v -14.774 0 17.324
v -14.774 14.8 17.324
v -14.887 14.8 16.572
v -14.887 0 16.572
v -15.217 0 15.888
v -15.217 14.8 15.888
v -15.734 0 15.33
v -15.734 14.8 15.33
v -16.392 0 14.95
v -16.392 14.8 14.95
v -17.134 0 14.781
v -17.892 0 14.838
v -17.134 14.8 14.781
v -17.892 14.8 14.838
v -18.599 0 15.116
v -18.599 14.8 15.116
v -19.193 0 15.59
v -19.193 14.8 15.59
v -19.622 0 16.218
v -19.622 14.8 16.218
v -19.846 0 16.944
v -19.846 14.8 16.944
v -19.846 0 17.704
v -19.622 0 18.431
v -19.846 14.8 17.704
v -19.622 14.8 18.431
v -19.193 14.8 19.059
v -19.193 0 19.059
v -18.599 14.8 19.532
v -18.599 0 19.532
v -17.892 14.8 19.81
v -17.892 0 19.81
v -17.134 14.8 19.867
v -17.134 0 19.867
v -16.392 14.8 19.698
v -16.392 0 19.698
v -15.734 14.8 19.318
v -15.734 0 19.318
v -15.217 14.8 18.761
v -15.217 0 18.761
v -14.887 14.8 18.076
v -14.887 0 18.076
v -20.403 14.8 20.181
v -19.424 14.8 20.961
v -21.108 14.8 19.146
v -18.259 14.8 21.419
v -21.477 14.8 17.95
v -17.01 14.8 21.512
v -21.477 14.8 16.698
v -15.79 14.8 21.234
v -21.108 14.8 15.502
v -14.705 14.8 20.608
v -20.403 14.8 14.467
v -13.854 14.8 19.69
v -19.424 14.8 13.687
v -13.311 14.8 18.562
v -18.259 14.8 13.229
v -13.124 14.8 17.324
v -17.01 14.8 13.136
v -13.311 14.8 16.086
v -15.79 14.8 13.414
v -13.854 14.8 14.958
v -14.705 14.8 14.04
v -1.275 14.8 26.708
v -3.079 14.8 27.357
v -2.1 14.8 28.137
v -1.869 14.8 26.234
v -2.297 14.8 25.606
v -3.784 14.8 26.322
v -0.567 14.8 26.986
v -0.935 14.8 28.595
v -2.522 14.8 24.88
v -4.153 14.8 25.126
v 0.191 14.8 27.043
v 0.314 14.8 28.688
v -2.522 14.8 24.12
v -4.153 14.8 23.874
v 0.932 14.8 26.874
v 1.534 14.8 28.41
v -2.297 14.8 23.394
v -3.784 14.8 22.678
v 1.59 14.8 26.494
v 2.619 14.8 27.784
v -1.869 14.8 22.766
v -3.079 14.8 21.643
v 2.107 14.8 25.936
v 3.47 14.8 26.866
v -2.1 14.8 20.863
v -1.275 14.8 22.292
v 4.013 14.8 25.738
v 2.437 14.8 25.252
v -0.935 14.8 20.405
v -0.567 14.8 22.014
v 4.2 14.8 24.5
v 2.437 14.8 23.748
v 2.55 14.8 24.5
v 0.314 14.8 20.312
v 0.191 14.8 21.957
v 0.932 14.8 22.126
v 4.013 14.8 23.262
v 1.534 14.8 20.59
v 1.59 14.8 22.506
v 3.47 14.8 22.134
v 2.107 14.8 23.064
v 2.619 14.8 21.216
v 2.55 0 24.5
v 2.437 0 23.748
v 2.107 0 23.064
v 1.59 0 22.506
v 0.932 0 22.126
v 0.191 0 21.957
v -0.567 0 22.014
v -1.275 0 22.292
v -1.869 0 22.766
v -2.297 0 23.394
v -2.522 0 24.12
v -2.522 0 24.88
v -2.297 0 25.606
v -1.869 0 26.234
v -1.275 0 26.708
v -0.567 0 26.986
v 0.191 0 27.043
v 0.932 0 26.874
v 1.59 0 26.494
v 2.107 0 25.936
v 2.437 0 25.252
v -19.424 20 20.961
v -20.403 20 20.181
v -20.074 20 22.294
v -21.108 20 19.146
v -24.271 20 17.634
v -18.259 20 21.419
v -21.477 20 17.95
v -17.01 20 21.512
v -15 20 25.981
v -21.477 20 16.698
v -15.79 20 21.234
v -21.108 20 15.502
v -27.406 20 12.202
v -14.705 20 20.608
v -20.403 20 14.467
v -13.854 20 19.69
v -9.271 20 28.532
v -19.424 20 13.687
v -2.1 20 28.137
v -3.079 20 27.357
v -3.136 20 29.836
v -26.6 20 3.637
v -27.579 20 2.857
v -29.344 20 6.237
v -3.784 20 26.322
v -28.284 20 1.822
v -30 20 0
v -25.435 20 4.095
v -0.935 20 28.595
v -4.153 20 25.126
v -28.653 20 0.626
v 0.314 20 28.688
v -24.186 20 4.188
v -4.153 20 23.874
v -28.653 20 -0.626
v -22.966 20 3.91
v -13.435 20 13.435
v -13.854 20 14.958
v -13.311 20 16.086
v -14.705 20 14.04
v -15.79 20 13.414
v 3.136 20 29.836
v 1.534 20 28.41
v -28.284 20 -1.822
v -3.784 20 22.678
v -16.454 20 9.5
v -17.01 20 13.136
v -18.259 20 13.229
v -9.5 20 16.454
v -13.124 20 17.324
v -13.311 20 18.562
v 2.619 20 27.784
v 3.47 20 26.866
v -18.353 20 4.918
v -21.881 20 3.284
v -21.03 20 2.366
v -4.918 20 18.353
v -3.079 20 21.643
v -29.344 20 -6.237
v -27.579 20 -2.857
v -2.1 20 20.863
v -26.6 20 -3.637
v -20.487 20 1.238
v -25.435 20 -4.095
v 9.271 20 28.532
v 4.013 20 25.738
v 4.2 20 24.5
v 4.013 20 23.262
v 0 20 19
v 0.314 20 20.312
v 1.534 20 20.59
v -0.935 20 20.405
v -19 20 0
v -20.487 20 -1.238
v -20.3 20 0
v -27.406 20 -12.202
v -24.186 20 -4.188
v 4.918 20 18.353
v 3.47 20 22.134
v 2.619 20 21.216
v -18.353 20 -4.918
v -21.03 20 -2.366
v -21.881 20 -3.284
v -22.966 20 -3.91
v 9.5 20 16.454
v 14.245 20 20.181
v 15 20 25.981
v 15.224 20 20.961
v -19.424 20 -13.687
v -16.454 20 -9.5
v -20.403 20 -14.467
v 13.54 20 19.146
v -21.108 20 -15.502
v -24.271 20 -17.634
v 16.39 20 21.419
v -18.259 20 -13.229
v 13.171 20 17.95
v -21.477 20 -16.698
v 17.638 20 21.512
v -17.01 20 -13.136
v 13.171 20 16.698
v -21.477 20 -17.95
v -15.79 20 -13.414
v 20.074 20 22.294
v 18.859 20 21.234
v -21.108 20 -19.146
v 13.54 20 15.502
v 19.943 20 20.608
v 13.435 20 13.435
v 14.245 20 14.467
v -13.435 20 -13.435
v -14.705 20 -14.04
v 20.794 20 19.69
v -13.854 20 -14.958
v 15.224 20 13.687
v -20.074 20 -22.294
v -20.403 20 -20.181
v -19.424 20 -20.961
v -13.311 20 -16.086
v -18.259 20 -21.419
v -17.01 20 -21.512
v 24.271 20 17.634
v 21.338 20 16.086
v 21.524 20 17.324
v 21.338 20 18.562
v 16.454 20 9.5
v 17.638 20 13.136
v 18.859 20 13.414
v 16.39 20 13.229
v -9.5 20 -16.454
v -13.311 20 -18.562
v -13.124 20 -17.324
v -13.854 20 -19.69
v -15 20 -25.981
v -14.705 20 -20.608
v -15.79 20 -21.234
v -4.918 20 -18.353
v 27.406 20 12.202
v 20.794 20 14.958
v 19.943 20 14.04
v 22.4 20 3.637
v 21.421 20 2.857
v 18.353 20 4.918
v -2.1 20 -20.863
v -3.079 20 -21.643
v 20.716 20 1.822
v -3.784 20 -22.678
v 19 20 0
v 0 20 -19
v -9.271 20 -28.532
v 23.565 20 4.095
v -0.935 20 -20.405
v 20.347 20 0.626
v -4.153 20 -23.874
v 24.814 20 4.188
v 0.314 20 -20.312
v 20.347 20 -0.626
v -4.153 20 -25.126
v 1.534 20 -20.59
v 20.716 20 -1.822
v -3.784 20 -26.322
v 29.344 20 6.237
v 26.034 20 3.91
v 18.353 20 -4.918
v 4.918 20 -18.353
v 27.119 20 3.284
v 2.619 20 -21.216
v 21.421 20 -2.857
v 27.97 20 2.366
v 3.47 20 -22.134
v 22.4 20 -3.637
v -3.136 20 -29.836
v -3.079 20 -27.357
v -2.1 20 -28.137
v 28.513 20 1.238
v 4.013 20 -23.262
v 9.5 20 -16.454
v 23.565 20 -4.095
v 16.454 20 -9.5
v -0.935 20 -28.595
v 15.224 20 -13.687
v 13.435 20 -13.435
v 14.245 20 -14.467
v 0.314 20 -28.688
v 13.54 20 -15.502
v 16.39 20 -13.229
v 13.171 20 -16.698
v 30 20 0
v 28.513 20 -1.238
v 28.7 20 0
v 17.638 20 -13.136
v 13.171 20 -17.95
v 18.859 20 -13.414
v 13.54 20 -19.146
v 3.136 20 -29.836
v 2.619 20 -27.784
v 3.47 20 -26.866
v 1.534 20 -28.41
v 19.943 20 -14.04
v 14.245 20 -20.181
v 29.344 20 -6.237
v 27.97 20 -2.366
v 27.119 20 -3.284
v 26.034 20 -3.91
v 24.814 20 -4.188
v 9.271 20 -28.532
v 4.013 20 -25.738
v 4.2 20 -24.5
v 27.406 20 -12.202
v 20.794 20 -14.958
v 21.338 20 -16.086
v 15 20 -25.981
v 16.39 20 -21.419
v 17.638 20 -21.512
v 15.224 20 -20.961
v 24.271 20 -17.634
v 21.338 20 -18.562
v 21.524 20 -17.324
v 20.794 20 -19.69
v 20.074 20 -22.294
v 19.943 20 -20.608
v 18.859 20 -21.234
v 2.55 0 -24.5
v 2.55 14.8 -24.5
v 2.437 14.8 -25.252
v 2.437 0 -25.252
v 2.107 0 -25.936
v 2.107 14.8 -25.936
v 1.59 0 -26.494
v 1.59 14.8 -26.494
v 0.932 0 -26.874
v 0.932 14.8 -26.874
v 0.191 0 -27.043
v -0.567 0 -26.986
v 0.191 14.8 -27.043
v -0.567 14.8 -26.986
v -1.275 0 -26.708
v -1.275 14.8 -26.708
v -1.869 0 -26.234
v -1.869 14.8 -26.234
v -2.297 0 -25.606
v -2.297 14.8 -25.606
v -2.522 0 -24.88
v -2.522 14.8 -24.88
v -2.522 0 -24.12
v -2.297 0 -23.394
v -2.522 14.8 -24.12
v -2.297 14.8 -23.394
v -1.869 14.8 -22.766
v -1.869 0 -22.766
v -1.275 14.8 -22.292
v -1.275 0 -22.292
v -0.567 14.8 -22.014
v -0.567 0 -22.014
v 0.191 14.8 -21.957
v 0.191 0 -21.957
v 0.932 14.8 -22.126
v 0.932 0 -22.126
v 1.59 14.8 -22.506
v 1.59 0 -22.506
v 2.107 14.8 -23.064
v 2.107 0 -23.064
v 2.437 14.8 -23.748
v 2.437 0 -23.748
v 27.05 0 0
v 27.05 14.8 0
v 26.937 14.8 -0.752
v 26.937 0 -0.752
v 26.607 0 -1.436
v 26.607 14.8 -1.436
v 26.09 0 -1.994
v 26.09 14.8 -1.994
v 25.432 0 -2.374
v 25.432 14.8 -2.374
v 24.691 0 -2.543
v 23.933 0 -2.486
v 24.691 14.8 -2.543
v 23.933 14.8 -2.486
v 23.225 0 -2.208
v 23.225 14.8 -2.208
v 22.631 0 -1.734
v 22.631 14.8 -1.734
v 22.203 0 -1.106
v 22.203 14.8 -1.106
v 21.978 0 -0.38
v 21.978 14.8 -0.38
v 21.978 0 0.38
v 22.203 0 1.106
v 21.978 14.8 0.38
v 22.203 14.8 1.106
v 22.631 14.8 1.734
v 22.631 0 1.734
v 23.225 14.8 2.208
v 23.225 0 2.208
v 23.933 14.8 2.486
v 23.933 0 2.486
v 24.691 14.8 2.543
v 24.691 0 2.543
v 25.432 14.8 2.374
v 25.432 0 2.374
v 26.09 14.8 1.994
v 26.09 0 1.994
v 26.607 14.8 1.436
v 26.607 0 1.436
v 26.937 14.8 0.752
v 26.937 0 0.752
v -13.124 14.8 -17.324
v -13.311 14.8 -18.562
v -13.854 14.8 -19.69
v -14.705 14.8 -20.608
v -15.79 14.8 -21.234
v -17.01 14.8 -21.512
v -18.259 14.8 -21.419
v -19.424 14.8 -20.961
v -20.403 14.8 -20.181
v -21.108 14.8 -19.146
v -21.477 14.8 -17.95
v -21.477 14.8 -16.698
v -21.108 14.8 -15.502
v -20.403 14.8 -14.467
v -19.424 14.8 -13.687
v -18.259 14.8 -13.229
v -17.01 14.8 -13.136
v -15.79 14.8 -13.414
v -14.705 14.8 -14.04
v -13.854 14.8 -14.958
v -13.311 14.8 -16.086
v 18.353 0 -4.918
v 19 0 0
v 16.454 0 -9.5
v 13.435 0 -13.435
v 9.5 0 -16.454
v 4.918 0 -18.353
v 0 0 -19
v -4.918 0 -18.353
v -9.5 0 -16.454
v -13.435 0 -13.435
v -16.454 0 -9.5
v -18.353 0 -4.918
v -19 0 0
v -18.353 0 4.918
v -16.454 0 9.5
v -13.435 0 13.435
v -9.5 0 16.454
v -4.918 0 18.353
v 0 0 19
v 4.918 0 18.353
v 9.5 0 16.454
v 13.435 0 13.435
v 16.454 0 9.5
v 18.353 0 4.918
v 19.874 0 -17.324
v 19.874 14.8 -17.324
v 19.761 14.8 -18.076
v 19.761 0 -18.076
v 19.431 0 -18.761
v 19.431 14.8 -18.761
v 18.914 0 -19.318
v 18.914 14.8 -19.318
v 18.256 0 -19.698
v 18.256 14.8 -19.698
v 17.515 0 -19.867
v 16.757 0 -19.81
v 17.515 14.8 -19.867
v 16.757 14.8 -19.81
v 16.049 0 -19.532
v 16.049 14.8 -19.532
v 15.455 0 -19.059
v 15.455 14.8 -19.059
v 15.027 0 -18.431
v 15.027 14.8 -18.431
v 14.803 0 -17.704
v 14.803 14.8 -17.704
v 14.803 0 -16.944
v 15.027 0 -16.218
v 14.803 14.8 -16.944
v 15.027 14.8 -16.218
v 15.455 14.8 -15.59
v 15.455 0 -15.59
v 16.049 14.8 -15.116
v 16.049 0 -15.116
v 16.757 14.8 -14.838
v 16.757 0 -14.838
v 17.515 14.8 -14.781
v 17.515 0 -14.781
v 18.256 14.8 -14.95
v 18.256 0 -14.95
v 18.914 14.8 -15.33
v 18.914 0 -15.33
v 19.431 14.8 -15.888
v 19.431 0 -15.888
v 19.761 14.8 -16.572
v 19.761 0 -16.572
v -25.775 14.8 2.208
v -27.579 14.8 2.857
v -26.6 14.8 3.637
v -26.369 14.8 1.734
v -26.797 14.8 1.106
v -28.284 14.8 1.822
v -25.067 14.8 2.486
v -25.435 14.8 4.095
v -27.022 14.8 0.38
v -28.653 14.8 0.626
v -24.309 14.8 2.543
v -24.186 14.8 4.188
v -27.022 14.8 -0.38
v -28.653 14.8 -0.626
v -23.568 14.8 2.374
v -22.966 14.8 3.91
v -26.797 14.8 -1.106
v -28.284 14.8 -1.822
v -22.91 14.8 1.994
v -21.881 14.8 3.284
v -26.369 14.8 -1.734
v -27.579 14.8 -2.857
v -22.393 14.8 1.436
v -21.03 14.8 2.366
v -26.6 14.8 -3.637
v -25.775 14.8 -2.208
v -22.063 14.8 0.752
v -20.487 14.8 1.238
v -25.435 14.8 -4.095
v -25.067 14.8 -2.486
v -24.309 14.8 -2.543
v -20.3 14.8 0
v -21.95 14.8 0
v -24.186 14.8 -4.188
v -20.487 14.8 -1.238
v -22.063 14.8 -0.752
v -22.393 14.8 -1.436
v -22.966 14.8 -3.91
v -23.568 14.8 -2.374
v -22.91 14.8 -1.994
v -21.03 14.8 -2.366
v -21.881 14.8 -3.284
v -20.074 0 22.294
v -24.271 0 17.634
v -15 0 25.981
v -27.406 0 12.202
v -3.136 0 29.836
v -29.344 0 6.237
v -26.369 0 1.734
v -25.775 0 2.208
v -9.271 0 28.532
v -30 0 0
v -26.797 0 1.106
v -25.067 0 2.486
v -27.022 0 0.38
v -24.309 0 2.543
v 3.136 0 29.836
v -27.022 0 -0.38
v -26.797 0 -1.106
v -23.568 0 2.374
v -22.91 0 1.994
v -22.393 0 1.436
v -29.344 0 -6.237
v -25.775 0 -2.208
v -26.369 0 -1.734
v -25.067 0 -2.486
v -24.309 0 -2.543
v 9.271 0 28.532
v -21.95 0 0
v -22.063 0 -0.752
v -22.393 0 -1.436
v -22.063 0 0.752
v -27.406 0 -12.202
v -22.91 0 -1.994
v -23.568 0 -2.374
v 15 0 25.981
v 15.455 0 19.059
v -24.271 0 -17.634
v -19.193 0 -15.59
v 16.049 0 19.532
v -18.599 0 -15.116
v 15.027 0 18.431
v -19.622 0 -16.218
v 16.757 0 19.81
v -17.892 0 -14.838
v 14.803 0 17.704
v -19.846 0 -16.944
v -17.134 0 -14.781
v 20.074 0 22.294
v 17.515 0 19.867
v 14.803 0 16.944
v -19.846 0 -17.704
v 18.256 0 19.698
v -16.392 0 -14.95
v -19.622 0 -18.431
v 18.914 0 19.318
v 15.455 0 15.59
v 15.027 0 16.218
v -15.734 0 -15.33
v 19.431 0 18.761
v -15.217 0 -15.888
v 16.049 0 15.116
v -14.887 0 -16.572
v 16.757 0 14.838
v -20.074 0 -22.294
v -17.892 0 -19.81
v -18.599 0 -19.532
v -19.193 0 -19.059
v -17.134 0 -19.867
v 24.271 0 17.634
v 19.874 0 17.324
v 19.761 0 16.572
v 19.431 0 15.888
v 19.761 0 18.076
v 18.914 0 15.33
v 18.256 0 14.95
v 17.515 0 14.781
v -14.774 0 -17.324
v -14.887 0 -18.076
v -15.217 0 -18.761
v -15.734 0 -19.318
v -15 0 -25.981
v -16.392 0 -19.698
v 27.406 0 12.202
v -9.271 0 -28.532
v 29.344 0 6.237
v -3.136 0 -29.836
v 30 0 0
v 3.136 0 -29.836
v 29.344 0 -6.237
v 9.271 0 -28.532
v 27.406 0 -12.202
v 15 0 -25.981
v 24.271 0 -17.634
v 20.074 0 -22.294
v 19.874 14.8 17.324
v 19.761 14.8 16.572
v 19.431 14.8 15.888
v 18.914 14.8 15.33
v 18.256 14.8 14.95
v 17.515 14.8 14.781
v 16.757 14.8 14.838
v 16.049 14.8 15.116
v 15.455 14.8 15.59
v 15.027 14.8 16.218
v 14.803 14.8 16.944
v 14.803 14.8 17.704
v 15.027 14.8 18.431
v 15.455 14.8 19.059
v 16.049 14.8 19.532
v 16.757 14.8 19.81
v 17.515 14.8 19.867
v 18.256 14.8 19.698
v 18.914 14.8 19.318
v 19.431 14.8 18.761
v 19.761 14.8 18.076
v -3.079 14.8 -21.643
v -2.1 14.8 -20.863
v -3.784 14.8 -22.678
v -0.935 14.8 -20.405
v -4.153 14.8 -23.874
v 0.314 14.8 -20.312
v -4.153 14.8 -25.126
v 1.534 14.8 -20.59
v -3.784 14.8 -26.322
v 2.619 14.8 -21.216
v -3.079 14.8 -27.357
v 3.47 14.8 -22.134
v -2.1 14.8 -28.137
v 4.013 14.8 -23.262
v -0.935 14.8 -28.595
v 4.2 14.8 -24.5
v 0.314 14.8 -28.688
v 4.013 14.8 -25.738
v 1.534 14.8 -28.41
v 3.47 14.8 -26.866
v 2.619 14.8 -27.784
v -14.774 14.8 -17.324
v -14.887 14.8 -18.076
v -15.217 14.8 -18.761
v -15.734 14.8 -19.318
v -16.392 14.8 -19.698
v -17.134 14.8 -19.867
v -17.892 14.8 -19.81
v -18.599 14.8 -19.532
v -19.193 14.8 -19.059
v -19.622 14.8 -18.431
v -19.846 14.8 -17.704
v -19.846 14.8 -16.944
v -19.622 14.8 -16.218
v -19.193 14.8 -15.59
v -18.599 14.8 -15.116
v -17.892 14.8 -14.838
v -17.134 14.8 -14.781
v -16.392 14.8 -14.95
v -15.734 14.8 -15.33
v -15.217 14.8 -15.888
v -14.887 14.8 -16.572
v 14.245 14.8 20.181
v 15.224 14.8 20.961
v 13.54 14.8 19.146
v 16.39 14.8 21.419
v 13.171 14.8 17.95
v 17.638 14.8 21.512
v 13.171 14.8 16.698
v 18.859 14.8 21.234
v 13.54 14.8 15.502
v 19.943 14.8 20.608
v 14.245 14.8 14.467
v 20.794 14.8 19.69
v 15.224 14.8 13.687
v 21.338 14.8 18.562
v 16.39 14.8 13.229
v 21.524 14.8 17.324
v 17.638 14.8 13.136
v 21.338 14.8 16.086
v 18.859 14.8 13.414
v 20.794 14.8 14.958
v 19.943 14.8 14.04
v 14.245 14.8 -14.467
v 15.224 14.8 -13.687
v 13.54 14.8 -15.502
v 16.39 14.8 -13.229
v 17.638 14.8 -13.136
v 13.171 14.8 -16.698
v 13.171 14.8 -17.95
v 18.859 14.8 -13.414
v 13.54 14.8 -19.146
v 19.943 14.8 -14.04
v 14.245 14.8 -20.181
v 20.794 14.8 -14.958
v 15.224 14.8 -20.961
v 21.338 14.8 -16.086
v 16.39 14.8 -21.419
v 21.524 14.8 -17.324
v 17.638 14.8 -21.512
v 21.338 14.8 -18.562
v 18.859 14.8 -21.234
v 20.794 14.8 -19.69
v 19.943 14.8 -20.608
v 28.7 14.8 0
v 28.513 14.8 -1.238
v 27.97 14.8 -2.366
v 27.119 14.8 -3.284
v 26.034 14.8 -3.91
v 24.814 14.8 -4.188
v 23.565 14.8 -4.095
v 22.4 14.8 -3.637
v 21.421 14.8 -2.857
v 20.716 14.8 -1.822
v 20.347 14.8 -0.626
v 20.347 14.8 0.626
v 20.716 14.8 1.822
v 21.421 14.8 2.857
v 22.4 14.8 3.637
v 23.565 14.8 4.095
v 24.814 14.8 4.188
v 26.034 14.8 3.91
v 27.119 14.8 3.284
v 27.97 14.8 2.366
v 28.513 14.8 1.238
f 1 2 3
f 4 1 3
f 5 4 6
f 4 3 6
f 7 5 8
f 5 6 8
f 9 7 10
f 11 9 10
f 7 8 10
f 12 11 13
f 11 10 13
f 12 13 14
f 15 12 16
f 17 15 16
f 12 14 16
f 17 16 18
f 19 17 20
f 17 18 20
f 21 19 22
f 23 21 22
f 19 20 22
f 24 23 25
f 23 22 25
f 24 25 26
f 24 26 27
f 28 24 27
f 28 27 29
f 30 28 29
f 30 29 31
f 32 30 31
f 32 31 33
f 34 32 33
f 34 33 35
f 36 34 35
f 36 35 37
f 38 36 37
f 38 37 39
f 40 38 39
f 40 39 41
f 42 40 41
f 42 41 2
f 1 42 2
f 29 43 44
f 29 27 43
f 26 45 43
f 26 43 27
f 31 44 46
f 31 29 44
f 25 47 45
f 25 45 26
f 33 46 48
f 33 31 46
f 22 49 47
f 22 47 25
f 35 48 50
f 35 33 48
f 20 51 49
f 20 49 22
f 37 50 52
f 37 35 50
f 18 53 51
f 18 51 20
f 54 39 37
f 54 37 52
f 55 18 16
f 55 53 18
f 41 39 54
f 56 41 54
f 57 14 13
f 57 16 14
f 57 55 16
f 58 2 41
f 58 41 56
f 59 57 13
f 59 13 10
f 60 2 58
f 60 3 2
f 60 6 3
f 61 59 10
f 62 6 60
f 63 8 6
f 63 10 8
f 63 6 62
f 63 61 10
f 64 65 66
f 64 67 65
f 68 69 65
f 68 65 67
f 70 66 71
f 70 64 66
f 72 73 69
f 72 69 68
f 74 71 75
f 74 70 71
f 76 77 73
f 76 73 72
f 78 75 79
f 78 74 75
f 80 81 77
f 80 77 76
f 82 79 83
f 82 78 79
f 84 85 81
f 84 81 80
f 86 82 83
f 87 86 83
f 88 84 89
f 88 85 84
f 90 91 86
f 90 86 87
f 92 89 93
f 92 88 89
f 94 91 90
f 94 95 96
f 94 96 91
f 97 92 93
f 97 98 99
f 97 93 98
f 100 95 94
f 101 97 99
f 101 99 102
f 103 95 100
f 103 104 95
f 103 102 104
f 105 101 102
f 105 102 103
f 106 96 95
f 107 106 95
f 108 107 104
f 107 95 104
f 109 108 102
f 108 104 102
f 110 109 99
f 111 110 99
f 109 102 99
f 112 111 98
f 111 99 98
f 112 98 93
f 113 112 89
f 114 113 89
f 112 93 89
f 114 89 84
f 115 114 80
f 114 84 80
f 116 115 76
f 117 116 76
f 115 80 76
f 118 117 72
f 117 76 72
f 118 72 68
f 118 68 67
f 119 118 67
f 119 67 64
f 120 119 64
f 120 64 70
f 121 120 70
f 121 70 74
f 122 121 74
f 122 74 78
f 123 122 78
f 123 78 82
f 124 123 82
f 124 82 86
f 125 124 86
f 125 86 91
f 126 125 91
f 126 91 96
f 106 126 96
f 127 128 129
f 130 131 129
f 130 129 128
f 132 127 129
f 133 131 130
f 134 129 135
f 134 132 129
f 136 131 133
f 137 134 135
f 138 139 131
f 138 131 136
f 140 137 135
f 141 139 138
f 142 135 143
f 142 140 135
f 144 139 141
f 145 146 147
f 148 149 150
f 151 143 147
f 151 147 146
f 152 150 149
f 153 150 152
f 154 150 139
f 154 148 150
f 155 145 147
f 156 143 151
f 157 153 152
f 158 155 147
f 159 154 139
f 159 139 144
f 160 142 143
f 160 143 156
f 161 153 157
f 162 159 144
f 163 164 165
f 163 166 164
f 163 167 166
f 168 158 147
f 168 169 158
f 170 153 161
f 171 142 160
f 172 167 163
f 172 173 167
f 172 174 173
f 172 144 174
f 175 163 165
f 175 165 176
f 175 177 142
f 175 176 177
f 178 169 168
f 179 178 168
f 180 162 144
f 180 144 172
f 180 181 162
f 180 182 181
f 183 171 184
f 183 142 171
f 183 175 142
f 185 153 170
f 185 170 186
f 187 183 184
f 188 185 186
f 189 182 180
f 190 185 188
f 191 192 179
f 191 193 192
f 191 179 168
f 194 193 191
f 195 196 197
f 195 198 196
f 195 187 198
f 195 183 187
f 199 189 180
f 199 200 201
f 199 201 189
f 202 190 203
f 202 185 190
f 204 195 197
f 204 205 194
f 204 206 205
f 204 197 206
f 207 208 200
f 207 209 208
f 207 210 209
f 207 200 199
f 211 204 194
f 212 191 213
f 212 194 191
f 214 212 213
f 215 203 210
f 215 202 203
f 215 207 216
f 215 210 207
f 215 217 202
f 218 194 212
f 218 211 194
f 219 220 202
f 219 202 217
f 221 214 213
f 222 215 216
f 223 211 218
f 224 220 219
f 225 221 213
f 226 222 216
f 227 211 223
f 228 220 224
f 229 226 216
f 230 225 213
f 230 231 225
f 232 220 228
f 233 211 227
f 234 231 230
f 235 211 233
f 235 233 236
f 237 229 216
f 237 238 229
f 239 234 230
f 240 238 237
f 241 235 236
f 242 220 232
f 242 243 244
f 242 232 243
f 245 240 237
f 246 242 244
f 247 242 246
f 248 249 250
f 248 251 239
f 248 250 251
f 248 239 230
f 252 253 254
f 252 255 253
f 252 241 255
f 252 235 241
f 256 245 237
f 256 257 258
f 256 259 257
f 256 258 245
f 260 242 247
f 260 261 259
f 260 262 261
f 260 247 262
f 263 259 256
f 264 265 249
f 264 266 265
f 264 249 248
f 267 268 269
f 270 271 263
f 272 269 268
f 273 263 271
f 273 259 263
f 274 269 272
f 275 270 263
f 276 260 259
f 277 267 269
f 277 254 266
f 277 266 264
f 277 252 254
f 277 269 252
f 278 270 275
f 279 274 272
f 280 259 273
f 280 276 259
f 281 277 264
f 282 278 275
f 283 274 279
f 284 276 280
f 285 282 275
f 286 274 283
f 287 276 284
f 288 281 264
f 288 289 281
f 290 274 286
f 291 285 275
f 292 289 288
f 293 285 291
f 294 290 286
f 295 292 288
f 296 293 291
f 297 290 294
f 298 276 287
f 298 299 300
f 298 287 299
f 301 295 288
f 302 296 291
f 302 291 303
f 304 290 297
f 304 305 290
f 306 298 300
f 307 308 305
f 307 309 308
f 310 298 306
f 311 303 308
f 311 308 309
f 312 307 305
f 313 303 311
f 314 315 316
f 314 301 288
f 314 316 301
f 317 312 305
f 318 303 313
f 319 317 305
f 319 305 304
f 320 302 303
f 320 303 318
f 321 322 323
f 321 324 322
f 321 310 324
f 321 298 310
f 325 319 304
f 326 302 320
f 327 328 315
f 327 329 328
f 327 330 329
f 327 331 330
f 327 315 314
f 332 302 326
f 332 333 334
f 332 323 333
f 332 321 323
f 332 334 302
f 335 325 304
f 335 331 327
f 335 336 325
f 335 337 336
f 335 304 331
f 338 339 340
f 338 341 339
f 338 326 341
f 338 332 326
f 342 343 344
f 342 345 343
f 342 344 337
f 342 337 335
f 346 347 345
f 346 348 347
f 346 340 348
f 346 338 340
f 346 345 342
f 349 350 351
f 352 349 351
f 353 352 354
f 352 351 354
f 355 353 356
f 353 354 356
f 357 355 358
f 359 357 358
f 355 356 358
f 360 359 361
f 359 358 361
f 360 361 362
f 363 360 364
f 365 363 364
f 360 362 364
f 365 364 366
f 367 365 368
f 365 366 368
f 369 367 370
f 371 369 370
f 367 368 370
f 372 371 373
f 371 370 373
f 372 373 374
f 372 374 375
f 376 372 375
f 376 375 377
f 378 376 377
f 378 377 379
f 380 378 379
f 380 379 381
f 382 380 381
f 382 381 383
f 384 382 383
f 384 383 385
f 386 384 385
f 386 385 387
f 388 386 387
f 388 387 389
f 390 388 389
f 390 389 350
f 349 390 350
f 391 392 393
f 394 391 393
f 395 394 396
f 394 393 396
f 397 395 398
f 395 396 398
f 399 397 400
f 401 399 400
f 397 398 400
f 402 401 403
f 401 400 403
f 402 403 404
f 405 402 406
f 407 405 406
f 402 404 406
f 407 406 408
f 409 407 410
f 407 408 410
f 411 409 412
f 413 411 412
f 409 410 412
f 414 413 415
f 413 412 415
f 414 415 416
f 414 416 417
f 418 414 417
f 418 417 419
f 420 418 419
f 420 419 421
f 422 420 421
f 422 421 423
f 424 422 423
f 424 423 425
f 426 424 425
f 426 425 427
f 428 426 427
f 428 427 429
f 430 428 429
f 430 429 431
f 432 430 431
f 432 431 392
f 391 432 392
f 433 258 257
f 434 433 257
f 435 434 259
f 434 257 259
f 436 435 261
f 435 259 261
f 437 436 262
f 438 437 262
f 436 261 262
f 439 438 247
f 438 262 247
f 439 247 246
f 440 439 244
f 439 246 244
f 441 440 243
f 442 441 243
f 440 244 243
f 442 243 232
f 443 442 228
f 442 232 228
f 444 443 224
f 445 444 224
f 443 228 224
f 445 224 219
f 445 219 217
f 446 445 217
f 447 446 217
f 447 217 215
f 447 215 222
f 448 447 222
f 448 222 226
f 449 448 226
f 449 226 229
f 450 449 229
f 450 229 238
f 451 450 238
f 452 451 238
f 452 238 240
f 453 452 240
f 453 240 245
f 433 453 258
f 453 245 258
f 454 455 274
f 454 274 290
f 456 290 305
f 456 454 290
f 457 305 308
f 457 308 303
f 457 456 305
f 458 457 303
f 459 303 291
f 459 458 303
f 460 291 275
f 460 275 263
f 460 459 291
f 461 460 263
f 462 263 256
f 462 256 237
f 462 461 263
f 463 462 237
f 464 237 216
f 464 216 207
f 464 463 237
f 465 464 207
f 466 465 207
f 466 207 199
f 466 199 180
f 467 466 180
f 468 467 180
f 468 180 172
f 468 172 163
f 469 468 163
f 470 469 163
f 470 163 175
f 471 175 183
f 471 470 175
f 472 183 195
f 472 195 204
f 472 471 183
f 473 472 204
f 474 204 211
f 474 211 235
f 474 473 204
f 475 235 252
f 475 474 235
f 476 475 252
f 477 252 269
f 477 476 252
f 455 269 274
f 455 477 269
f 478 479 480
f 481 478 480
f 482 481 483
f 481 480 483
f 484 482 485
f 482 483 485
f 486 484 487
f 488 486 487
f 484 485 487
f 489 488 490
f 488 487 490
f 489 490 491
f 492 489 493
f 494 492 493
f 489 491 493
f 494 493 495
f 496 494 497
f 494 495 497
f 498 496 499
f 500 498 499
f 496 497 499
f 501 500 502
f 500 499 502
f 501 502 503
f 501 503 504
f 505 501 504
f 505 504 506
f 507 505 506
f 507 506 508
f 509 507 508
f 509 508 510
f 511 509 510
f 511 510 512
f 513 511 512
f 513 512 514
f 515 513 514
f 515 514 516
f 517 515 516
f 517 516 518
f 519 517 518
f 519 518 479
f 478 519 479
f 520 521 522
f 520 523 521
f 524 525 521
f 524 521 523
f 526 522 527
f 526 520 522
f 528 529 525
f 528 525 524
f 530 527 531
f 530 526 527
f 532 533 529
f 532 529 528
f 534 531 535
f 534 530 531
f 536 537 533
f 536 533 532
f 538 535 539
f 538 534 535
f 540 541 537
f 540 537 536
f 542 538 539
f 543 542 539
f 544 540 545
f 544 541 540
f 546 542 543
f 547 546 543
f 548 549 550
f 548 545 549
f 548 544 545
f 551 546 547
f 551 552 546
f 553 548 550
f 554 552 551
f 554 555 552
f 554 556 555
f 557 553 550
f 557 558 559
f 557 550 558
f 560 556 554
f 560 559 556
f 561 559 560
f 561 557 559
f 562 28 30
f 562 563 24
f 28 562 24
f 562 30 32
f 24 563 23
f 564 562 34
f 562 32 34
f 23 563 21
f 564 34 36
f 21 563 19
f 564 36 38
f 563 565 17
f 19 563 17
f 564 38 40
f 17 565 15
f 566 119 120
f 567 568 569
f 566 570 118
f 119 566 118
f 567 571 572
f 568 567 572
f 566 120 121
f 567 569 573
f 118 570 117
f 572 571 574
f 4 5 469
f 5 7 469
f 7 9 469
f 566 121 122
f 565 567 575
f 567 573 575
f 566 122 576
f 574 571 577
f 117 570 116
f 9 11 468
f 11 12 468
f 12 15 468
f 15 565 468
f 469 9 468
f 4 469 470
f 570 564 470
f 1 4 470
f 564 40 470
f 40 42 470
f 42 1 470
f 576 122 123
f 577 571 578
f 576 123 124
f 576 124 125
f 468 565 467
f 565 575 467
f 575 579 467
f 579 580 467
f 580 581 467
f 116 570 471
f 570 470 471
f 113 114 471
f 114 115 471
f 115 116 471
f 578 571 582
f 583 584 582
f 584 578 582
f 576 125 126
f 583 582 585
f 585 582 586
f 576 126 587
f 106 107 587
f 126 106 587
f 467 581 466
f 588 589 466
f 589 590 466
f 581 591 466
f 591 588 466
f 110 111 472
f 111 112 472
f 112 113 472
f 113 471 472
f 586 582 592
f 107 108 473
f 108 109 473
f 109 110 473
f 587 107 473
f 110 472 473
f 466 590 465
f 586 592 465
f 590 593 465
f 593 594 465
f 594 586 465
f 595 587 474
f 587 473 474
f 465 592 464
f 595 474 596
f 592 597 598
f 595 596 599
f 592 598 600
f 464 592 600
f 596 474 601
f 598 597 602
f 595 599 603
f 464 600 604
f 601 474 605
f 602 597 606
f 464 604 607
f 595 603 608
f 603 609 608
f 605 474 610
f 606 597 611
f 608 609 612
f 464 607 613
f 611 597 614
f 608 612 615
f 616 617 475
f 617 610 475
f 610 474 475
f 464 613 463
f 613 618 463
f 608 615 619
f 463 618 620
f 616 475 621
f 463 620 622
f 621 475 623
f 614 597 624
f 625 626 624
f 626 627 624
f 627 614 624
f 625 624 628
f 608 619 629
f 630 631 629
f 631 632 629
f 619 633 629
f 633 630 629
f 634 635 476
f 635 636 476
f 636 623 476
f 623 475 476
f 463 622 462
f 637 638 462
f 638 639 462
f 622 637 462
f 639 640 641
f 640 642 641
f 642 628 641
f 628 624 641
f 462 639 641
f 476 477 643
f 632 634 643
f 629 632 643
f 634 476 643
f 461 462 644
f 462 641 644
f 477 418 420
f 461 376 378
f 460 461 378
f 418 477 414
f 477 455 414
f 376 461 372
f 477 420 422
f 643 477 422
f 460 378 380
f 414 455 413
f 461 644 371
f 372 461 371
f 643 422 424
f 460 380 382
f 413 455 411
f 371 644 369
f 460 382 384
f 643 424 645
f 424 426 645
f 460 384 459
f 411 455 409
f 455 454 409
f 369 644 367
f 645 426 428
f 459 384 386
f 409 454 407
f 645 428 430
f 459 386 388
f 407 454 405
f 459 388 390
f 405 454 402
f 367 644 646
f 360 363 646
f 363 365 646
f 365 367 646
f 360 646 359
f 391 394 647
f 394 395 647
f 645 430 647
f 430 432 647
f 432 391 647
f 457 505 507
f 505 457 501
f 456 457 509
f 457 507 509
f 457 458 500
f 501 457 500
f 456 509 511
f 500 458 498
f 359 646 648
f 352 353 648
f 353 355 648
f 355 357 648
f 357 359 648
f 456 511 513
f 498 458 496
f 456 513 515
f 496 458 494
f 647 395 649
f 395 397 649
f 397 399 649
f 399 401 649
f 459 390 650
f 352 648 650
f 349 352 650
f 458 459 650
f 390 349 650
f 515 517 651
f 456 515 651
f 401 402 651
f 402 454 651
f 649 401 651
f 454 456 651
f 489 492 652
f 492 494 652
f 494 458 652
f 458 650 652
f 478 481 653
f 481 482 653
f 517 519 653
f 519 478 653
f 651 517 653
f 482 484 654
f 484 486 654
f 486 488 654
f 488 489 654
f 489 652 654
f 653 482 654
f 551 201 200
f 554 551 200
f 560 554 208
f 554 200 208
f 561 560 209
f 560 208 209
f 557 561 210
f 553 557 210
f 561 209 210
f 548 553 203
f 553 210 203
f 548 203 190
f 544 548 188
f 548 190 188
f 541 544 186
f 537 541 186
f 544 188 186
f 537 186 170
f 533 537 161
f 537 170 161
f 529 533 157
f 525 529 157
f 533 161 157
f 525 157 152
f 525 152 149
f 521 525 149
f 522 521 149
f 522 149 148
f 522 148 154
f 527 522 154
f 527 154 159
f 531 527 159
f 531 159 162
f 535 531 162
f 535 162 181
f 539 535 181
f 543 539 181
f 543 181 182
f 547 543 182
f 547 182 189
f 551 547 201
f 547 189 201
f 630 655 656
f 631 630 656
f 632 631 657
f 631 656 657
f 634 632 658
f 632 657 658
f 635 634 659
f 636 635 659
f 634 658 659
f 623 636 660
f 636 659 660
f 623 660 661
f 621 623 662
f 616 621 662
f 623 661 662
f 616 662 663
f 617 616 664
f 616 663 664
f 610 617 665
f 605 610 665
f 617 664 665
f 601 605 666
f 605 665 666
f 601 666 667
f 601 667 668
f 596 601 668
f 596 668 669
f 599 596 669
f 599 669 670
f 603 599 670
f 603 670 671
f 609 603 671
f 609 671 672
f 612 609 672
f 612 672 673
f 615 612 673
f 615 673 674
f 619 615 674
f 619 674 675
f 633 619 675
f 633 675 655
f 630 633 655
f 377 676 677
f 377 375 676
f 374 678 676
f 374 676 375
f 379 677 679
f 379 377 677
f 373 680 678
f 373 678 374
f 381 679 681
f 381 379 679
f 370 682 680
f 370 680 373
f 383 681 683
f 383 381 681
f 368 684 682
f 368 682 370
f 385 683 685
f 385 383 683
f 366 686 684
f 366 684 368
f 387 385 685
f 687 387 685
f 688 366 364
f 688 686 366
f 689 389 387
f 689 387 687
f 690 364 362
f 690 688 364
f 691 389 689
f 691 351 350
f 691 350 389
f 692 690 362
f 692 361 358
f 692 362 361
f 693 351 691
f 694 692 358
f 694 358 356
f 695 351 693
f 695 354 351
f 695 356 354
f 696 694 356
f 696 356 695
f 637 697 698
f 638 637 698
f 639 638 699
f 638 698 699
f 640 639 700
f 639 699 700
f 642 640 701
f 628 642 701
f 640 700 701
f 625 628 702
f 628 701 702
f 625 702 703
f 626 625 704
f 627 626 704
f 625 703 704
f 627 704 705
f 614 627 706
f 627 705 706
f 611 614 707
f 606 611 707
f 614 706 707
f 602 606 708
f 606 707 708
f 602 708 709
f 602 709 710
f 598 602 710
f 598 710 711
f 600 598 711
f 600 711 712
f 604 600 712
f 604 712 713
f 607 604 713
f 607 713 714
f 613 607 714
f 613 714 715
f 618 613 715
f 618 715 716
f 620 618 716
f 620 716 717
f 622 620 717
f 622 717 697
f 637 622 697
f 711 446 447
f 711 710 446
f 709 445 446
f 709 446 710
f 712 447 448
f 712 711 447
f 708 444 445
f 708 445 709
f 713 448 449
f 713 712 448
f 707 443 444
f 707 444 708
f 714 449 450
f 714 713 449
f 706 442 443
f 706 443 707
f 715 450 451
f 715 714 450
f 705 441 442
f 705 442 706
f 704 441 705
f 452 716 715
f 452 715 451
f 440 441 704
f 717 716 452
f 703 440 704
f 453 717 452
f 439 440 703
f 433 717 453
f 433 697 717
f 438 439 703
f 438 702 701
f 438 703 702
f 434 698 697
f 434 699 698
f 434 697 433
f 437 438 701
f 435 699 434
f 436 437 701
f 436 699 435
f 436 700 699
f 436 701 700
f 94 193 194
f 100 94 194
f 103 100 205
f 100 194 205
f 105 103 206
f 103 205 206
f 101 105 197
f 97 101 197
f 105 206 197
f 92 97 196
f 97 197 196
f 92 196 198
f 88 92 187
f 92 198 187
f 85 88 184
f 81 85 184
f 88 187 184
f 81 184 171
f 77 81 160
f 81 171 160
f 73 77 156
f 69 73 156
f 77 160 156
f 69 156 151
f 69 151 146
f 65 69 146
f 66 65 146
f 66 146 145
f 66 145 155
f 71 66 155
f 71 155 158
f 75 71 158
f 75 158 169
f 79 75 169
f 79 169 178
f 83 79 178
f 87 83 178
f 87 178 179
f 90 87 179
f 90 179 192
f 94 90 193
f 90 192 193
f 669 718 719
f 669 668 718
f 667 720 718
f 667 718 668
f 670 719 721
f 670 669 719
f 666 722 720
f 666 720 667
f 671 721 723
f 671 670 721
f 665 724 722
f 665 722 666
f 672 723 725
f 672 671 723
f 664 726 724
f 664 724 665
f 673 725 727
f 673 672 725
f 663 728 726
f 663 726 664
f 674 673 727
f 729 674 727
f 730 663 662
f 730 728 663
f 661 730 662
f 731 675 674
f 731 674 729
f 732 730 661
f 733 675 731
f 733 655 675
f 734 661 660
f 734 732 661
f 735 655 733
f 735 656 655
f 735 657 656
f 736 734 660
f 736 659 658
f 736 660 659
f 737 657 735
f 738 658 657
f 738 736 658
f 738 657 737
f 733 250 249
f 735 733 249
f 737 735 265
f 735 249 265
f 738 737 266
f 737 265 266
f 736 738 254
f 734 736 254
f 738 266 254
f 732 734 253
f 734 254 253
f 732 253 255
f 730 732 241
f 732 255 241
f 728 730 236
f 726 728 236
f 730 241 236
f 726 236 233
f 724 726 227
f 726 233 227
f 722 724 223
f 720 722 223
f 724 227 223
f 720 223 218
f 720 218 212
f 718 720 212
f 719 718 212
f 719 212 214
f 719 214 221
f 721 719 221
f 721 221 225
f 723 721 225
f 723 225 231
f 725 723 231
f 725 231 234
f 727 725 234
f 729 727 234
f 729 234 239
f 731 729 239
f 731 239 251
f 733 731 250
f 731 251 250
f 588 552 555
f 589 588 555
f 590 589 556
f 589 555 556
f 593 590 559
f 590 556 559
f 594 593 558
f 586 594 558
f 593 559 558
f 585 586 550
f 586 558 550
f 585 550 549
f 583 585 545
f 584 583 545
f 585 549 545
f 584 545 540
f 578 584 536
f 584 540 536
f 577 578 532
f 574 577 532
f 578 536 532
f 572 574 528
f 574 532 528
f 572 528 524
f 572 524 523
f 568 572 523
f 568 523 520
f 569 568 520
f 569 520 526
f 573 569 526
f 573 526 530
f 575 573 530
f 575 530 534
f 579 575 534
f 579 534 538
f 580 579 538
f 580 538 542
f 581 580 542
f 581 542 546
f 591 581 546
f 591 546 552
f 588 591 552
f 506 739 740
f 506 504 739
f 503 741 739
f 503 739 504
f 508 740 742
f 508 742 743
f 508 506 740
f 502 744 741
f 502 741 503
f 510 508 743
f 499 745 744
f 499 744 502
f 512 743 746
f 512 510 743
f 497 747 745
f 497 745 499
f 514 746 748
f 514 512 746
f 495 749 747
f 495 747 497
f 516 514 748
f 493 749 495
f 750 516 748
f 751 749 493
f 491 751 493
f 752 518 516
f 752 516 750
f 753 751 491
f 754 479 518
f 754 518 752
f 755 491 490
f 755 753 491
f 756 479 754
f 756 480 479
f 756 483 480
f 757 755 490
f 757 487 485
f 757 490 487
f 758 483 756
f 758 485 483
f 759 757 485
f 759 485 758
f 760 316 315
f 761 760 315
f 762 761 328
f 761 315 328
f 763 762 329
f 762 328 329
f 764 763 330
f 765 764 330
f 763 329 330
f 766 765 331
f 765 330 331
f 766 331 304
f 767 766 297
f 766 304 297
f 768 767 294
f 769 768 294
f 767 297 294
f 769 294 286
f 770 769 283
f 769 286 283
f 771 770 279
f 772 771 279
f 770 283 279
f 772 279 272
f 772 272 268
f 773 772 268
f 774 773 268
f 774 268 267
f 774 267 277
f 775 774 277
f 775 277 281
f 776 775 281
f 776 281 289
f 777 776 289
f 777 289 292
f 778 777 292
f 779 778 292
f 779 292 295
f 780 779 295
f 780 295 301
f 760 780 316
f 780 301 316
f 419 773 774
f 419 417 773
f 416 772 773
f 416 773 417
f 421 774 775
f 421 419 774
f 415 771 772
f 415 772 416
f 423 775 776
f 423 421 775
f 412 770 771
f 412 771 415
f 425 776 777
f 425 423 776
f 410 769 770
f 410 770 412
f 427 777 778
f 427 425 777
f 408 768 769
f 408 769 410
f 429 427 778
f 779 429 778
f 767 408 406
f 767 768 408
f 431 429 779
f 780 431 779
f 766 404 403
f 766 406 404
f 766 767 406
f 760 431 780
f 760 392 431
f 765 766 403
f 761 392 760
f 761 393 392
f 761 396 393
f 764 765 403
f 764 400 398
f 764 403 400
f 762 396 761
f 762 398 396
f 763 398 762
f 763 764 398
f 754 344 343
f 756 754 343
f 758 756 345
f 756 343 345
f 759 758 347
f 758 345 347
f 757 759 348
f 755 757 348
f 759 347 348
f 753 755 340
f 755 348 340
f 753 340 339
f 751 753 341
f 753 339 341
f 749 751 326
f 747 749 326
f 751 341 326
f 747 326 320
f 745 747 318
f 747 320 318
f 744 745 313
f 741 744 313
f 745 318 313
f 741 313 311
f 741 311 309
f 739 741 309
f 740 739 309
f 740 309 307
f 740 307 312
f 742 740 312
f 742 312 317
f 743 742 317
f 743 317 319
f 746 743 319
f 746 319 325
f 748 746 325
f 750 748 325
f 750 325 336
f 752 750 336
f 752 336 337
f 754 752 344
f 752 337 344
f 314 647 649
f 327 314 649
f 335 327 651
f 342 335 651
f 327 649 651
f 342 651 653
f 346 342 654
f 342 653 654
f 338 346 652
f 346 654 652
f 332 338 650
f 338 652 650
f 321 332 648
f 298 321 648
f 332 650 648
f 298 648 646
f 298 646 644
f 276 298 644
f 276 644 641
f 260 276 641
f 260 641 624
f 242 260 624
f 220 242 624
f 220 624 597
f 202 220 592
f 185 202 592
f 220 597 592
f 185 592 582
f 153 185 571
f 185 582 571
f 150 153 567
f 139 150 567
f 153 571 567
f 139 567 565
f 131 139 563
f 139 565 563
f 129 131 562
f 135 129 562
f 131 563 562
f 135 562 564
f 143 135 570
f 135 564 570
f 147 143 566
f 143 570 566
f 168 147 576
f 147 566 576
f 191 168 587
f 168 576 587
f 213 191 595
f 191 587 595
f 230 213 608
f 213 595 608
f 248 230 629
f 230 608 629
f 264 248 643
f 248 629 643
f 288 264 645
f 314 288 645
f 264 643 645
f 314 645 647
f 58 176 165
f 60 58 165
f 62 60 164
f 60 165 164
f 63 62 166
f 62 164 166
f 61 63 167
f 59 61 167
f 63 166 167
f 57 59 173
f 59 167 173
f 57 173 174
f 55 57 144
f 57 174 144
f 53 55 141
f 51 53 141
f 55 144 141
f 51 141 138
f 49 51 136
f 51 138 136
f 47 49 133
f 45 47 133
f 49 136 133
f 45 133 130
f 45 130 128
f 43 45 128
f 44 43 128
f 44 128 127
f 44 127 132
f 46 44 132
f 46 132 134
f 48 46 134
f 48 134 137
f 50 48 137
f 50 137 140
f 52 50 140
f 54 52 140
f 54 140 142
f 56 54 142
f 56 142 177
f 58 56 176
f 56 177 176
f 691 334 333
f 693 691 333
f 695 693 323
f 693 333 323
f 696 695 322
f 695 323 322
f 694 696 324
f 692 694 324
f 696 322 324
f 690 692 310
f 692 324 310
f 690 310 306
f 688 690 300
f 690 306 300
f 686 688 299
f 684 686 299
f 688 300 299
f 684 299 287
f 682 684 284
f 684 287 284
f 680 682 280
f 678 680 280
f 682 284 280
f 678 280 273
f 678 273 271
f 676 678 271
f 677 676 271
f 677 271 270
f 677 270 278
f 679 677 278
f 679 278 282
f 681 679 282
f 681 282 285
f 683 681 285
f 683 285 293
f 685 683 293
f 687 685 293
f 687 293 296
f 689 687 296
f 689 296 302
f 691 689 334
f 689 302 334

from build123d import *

# Parameters (mm, degrees)
ESQUISSE1_R             = 30
ESQUISSE1_R_2           = 19
BOSS_EXTRU_2_DEPTH      = 20
ESQUISSE5_R             = 2.55
ENL_V_MAT_EXTRU_3_DEPTH = 21
ESQUISSE6_R             = 4.2
ENL_V_MAT_EXTRU_4_DEPTH = 5.2


with BuildPart() as part:
    # Esquisse1 → Boss.-Extru.2 (new body)
    with BuildSketch(Plane(origin=(0, 0, 0), x_dir=(1, 0, 0), z_dir=(0, 1, 0))):
        Circle(ESQUISSE1_R)
        Circle(ESQUISSE1_R_2, mode=Mode.SUBTRACT)
    extrude(amount=BOSS_EXTRU_2_DEPTH)

    # Esquisse5 → Enlèv. mat.-Extru.3 (cut, through all)
    with BuildSketch(Plane(origin=(0, 20, 0), x_dir=(1, 0, 0), z_dir=(0, 1, 0))):
        with Locations((24.5, 0)):
            Circle(ESQUISSE5_R)
        with Locations((17.324116139, -17.324116139)):
            Circle(ESQUISSE5_R)
        with Locations((0, -24.5)):
            Circle(ESQUISSE5_R)
        with Locations((-17.324116139, -17.324116139)):
            Circle(ESQUISSE5_R)
        with Locations((-24.5, 0)):
            Circle(ESQUISSE5_R)
        with Locations((-17.324116139, 17.324116139)):
            Circle(ESQUISSE5_R)
        with Locations((0, 24.5)):
            Circle(ESQUISSE5_R)
        with Locations((17.324116139, 17.324116139)):
            Circle(ESQUISSE5_R)
    extrude(amount=-ENL_V_MAT_EXTRU_3_DEPTH, mode=Mode.SUBTRACT)

    # Esquisse6 → Enlèv. mat.-Extru.4 (cut)
    with BuildSketch(Plane(origin=(0, 20, 0), x_dir=(1, 0, 0), z_dir=(0, 1, 0))):
        with Locations((24.5, 0)):
            Circle(ESQUISSE6_R)
        with Locations((17.324116139, 17.324116139)):
            Circle(ESQUISSE6_R)
        with Locations((0, 24.5)):
            Circle(ESQUISSE6_R)
        with Locations((-17.324116139, 17.324116139)):
            Circle(ESQUISSE6_R)
        with Locations((-24.5, 0)):
            Circle(ESQUISSE6_R)
        with Locations((-17.324116139, -17.324116139)):
            Circle(ESQUISSE6_R)
        with Locations((0, -24.5)):
            Circle(ESQUISSE6_R)
        with Locations((17.324116139, -17.324116139)):
            Circle(ESQUISSE6_R)
    extrude(amount=-ENL_V_MAT_EXTRU_4_DEPTH, mode=Mode.SUBTRACT)


solid = part.part
